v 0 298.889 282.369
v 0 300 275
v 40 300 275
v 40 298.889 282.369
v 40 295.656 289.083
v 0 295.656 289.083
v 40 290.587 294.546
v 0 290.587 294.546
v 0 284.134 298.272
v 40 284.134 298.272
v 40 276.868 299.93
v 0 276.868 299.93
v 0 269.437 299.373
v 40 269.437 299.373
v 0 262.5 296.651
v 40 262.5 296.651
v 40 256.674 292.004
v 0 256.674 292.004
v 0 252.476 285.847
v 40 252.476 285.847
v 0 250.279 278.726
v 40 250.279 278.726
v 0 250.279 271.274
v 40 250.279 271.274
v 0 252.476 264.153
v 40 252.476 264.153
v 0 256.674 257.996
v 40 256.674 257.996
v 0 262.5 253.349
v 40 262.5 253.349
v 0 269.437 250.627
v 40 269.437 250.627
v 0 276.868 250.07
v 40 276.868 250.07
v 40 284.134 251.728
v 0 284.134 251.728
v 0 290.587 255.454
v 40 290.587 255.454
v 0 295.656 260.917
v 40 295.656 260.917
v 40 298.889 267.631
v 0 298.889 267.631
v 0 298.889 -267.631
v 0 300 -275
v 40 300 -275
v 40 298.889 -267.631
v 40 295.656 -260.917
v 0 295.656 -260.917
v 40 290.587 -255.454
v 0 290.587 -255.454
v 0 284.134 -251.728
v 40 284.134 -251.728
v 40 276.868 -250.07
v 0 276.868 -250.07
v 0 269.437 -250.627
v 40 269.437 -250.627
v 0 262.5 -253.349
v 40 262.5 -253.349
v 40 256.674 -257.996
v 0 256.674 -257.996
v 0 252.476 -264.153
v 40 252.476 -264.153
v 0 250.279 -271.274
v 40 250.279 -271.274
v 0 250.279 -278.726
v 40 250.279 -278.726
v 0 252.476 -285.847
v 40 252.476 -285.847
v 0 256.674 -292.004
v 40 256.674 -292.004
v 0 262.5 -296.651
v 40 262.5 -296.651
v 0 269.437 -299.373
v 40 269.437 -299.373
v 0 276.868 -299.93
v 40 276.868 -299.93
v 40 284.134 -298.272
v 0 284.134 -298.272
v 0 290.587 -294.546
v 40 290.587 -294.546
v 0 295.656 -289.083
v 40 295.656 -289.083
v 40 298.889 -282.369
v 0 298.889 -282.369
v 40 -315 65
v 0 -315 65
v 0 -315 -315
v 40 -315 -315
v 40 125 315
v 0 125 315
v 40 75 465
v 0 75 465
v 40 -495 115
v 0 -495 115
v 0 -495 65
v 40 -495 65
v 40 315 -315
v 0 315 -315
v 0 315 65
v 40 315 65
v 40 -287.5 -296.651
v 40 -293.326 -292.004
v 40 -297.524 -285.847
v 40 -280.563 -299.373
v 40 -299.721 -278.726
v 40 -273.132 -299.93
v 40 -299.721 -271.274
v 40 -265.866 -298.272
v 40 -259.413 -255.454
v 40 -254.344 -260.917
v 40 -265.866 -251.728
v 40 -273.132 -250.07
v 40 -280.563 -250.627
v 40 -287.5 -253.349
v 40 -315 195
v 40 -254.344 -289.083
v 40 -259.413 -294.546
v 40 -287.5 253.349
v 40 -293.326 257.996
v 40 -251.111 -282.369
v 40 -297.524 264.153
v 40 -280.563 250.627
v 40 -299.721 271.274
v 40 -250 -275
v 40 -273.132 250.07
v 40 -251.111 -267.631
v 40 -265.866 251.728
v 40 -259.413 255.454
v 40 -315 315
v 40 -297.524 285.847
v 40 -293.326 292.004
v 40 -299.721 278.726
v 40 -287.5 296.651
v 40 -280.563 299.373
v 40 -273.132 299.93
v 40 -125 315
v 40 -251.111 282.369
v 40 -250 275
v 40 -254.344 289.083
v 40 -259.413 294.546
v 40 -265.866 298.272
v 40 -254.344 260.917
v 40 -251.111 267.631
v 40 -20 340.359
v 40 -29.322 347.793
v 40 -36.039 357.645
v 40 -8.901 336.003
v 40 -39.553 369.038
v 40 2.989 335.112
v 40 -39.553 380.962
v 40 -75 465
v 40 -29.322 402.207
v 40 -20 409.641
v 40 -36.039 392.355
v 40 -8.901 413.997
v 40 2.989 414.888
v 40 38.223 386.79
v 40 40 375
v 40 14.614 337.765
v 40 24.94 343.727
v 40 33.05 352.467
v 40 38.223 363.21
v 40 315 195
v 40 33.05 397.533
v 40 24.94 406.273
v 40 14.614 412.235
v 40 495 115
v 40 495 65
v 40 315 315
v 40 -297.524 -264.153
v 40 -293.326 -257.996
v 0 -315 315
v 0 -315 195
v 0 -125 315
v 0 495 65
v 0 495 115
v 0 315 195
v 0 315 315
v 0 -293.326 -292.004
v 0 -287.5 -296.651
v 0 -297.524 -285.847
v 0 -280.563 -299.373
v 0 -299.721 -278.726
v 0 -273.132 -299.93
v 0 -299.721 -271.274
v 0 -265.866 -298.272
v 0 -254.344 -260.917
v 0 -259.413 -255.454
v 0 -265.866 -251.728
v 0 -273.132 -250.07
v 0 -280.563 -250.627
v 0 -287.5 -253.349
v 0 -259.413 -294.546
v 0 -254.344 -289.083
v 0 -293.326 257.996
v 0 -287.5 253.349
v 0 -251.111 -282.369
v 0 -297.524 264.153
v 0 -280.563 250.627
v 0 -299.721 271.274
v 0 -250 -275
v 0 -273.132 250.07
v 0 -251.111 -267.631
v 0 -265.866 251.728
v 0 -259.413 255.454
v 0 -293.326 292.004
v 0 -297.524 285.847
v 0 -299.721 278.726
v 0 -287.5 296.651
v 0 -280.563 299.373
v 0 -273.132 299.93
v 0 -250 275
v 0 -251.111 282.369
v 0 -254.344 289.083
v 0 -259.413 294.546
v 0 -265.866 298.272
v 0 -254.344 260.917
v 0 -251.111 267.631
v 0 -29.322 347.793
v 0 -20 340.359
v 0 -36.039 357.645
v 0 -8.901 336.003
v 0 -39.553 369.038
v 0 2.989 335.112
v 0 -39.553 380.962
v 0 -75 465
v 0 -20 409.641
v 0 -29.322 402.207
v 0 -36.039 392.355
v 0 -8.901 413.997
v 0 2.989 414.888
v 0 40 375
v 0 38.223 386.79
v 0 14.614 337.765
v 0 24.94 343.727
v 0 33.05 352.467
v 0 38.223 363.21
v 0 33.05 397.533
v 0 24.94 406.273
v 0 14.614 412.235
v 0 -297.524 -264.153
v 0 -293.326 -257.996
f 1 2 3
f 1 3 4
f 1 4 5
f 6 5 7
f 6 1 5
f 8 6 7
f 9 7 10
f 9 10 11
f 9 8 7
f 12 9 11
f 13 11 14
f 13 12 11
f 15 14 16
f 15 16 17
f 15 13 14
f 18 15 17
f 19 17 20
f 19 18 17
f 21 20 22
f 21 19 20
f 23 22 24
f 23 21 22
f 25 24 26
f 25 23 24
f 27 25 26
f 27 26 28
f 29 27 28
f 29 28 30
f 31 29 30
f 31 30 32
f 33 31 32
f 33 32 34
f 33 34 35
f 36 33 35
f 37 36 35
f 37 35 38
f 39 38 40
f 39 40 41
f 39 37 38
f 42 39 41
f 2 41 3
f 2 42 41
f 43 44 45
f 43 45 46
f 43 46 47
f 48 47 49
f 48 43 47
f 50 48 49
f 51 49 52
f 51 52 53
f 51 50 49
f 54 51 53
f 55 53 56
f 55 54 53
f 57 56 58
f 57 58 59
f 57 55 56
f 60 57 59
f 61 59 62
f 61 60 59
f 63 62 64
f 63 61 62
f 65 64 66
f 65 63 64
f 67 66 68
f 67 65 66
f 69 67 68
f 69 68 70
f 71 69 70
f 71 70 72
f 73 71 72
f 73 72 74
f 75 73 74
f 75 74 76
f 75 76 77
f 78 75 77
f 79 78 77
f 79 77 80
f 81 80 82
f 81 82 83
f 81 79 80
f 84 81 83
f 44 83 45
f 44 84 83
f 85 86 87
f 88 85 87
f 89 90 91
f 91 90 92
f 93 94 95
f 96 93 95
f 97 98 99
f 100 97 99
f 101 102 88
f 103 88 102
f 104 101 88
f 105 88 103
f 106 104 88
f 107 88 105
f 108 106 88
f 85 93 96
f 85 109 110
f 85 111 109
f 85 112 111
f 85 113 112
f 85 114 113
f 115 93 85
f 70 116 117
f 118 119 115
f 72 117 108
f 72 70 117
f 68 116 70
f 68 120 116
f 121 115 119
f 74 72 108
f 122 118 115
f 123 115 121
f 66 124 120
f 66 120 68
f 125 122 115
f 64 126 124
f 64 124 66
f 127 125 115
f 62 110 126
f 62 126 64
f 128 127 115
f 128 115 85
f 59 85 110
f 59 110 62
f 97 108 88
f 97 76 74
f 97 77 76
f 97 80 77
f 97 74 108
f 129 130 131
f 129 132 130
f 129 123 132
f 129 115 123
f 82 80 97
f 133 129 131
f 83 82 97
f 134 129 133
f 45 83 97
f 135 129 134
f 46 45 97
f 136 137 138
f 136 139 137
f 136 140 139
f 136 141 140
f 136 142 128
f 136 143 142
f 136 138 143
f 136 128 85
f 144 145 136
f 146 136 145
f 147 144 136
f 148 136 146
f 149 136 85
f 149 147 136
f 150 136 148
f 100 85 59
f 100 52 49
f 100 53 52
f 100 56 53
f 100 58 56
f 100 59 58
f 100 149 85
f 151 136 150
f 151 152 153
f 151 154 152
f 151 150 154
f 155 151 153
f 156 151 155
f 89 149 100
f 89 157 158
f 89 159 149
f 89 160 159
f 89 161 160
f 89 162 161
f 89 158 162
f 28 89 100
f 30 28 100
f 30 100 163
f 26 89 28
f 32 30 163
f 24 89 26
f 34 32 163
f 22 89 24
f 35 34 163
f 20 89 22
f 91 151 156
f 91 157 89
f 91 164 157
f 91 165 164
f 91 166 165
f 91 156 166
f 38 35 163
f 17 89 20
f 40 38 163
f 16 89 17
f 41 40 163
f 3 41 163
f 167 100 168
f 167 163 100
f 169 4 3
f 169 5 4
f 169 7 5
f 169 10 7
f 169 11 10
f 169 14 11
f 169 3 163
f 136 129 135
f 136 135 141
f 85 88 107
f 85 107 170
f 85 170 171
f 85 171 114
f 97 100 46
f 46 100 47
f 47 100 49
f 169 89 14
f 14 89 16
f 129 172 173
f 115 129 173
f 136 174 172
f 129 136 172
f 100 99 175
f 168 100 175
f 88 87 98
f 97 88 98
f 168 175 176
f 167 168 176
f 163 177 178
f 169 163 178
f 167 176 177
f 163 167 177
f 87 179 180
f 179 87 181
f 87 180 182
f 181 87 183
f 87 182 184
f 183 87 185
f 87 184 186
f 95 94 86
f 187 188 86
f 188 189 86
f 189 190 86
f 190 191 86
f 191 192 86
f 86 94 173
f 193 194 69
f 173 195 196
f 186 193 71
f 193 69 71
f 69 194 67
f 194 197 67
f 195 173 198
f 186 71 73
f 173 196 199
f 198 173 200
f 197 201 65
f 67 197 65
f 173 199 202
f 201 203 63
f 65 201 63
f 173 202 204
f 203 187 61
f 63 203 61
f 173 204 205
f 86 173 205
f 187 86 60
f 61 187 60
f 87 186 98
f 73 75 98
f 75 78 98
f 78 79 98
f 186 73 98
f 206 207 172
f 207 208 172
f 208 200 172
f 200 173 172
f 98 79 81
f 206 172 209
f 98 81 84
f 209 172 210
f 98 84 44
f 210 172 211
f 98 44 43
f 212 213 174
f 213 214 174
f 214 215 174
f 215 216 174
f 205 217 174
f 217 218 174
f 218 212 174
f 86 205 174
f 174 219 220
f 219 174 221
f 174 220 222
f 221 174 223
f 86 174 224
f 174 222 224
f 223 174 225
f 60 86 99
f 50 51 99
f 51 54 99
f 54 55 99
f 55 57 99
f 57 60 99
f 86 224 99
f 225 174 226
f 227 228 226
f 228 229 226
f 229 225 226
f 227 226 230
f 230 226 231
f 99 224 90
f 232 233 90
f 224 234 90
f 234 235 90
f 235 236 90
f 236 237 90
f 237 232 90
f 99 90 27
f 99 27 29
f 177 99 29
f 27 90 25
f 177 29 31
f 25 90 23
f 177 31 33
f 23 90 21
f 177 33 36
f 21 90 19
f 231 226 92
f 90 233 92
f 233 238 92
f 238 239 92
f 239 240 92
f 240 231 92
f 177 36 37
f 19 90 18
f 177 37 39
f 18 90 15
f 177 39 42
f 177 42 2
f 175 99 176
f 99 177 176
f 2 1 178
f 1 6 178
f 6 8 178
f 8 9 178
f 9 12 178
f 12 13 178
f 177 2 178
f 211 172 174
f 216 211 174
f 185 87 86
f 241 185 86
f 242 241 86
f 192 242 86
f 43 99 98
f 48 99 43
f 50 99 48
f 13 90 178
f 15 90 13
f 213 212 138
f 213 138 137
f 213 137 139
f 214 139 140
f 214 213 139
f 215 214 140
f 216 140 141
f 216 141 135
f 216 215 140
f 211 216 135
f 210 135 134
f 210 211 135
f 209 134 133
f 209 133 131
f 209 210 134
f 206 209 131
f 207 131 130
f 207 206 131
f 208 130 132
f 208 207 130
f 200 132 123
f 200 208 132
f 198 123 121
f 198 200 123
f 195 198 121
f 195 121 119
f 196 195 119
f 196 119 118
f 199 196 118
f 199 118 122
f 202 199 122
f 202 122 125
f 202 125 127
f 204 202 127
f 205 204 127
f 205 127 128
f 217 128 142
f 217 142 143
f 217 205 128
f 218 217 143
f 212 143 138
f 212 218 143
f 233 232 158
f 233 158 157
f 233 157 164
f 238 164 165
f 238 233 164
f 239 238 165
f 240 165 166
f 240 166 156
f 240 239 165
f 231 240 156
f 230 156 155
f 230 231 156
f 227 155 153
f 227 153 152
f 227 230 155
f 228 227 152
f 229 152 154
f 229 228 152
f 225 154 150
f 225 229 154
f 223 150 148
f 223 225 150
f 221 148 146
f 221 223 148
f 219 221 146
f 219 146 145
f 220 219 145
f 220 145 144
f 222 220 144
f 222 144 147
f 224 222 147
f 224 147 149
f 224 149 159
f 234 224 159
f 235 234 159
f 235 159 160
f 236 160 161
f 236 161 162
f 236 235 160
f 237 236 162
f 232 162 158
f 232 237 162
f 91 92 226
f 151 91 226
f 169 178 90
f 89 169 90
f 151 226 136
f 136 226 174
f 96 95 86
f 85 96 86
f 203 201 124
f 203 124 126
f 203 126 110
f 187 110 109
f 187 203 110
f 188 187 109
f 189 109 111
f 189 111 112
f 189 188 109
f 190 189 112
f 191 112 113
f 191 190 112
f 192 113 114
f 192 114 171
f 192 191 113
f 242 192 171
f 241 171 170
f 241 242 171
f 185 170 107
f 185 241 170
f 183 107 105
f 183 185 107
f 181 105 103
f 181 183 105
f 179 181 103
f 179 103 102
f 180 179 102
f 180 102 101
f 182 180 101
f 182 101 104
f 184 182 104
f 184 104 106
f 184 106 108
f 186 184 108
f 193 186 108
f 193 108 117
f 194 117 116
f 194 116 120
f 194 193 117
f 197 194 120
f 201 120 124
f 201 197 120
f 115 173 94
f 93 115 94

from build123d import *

# Parameters (mm, degrees)
F0_R     = 25
F0_R_2   = 40
F1_DEPTH = 40


with BuildPart() as f1:
    # F0 (on Right) → F1 (new body)
    with BuildSketch(Plane.YZ):
        Polygon((-125, 315), (-315, 315), (-315, 195), (-495, 115), (-495, 65), (-315, 65), (-315, -315), (-125, -315), (125, -315), (315, -315), (315, 65), (495, 65), (495, 115), (315, 195), (315, 315), (125, 315), (75, 465), (-75, 465), align=None)
        with Locations((-275, -275)):
            Circle(F0_R, mode=Mode.SUBTRACT)
        with Locations((275, -275)):
            Circle(F0_R, mode=Mode.SUBTRACT)
        with Locations((-275, 275)):
            Circle(F0_R, mode=Mode.SUBTRACT)
        with Locations((0, 375)):
            Circle(F0_R_2, mode=Mode.SUBTRACT)
        with Locations((275, 275)):
            Circle(F0_R, mode=Mode.SUBTRACT)
    extrude(amount=F1_DEPTH)


solid = f1.part
